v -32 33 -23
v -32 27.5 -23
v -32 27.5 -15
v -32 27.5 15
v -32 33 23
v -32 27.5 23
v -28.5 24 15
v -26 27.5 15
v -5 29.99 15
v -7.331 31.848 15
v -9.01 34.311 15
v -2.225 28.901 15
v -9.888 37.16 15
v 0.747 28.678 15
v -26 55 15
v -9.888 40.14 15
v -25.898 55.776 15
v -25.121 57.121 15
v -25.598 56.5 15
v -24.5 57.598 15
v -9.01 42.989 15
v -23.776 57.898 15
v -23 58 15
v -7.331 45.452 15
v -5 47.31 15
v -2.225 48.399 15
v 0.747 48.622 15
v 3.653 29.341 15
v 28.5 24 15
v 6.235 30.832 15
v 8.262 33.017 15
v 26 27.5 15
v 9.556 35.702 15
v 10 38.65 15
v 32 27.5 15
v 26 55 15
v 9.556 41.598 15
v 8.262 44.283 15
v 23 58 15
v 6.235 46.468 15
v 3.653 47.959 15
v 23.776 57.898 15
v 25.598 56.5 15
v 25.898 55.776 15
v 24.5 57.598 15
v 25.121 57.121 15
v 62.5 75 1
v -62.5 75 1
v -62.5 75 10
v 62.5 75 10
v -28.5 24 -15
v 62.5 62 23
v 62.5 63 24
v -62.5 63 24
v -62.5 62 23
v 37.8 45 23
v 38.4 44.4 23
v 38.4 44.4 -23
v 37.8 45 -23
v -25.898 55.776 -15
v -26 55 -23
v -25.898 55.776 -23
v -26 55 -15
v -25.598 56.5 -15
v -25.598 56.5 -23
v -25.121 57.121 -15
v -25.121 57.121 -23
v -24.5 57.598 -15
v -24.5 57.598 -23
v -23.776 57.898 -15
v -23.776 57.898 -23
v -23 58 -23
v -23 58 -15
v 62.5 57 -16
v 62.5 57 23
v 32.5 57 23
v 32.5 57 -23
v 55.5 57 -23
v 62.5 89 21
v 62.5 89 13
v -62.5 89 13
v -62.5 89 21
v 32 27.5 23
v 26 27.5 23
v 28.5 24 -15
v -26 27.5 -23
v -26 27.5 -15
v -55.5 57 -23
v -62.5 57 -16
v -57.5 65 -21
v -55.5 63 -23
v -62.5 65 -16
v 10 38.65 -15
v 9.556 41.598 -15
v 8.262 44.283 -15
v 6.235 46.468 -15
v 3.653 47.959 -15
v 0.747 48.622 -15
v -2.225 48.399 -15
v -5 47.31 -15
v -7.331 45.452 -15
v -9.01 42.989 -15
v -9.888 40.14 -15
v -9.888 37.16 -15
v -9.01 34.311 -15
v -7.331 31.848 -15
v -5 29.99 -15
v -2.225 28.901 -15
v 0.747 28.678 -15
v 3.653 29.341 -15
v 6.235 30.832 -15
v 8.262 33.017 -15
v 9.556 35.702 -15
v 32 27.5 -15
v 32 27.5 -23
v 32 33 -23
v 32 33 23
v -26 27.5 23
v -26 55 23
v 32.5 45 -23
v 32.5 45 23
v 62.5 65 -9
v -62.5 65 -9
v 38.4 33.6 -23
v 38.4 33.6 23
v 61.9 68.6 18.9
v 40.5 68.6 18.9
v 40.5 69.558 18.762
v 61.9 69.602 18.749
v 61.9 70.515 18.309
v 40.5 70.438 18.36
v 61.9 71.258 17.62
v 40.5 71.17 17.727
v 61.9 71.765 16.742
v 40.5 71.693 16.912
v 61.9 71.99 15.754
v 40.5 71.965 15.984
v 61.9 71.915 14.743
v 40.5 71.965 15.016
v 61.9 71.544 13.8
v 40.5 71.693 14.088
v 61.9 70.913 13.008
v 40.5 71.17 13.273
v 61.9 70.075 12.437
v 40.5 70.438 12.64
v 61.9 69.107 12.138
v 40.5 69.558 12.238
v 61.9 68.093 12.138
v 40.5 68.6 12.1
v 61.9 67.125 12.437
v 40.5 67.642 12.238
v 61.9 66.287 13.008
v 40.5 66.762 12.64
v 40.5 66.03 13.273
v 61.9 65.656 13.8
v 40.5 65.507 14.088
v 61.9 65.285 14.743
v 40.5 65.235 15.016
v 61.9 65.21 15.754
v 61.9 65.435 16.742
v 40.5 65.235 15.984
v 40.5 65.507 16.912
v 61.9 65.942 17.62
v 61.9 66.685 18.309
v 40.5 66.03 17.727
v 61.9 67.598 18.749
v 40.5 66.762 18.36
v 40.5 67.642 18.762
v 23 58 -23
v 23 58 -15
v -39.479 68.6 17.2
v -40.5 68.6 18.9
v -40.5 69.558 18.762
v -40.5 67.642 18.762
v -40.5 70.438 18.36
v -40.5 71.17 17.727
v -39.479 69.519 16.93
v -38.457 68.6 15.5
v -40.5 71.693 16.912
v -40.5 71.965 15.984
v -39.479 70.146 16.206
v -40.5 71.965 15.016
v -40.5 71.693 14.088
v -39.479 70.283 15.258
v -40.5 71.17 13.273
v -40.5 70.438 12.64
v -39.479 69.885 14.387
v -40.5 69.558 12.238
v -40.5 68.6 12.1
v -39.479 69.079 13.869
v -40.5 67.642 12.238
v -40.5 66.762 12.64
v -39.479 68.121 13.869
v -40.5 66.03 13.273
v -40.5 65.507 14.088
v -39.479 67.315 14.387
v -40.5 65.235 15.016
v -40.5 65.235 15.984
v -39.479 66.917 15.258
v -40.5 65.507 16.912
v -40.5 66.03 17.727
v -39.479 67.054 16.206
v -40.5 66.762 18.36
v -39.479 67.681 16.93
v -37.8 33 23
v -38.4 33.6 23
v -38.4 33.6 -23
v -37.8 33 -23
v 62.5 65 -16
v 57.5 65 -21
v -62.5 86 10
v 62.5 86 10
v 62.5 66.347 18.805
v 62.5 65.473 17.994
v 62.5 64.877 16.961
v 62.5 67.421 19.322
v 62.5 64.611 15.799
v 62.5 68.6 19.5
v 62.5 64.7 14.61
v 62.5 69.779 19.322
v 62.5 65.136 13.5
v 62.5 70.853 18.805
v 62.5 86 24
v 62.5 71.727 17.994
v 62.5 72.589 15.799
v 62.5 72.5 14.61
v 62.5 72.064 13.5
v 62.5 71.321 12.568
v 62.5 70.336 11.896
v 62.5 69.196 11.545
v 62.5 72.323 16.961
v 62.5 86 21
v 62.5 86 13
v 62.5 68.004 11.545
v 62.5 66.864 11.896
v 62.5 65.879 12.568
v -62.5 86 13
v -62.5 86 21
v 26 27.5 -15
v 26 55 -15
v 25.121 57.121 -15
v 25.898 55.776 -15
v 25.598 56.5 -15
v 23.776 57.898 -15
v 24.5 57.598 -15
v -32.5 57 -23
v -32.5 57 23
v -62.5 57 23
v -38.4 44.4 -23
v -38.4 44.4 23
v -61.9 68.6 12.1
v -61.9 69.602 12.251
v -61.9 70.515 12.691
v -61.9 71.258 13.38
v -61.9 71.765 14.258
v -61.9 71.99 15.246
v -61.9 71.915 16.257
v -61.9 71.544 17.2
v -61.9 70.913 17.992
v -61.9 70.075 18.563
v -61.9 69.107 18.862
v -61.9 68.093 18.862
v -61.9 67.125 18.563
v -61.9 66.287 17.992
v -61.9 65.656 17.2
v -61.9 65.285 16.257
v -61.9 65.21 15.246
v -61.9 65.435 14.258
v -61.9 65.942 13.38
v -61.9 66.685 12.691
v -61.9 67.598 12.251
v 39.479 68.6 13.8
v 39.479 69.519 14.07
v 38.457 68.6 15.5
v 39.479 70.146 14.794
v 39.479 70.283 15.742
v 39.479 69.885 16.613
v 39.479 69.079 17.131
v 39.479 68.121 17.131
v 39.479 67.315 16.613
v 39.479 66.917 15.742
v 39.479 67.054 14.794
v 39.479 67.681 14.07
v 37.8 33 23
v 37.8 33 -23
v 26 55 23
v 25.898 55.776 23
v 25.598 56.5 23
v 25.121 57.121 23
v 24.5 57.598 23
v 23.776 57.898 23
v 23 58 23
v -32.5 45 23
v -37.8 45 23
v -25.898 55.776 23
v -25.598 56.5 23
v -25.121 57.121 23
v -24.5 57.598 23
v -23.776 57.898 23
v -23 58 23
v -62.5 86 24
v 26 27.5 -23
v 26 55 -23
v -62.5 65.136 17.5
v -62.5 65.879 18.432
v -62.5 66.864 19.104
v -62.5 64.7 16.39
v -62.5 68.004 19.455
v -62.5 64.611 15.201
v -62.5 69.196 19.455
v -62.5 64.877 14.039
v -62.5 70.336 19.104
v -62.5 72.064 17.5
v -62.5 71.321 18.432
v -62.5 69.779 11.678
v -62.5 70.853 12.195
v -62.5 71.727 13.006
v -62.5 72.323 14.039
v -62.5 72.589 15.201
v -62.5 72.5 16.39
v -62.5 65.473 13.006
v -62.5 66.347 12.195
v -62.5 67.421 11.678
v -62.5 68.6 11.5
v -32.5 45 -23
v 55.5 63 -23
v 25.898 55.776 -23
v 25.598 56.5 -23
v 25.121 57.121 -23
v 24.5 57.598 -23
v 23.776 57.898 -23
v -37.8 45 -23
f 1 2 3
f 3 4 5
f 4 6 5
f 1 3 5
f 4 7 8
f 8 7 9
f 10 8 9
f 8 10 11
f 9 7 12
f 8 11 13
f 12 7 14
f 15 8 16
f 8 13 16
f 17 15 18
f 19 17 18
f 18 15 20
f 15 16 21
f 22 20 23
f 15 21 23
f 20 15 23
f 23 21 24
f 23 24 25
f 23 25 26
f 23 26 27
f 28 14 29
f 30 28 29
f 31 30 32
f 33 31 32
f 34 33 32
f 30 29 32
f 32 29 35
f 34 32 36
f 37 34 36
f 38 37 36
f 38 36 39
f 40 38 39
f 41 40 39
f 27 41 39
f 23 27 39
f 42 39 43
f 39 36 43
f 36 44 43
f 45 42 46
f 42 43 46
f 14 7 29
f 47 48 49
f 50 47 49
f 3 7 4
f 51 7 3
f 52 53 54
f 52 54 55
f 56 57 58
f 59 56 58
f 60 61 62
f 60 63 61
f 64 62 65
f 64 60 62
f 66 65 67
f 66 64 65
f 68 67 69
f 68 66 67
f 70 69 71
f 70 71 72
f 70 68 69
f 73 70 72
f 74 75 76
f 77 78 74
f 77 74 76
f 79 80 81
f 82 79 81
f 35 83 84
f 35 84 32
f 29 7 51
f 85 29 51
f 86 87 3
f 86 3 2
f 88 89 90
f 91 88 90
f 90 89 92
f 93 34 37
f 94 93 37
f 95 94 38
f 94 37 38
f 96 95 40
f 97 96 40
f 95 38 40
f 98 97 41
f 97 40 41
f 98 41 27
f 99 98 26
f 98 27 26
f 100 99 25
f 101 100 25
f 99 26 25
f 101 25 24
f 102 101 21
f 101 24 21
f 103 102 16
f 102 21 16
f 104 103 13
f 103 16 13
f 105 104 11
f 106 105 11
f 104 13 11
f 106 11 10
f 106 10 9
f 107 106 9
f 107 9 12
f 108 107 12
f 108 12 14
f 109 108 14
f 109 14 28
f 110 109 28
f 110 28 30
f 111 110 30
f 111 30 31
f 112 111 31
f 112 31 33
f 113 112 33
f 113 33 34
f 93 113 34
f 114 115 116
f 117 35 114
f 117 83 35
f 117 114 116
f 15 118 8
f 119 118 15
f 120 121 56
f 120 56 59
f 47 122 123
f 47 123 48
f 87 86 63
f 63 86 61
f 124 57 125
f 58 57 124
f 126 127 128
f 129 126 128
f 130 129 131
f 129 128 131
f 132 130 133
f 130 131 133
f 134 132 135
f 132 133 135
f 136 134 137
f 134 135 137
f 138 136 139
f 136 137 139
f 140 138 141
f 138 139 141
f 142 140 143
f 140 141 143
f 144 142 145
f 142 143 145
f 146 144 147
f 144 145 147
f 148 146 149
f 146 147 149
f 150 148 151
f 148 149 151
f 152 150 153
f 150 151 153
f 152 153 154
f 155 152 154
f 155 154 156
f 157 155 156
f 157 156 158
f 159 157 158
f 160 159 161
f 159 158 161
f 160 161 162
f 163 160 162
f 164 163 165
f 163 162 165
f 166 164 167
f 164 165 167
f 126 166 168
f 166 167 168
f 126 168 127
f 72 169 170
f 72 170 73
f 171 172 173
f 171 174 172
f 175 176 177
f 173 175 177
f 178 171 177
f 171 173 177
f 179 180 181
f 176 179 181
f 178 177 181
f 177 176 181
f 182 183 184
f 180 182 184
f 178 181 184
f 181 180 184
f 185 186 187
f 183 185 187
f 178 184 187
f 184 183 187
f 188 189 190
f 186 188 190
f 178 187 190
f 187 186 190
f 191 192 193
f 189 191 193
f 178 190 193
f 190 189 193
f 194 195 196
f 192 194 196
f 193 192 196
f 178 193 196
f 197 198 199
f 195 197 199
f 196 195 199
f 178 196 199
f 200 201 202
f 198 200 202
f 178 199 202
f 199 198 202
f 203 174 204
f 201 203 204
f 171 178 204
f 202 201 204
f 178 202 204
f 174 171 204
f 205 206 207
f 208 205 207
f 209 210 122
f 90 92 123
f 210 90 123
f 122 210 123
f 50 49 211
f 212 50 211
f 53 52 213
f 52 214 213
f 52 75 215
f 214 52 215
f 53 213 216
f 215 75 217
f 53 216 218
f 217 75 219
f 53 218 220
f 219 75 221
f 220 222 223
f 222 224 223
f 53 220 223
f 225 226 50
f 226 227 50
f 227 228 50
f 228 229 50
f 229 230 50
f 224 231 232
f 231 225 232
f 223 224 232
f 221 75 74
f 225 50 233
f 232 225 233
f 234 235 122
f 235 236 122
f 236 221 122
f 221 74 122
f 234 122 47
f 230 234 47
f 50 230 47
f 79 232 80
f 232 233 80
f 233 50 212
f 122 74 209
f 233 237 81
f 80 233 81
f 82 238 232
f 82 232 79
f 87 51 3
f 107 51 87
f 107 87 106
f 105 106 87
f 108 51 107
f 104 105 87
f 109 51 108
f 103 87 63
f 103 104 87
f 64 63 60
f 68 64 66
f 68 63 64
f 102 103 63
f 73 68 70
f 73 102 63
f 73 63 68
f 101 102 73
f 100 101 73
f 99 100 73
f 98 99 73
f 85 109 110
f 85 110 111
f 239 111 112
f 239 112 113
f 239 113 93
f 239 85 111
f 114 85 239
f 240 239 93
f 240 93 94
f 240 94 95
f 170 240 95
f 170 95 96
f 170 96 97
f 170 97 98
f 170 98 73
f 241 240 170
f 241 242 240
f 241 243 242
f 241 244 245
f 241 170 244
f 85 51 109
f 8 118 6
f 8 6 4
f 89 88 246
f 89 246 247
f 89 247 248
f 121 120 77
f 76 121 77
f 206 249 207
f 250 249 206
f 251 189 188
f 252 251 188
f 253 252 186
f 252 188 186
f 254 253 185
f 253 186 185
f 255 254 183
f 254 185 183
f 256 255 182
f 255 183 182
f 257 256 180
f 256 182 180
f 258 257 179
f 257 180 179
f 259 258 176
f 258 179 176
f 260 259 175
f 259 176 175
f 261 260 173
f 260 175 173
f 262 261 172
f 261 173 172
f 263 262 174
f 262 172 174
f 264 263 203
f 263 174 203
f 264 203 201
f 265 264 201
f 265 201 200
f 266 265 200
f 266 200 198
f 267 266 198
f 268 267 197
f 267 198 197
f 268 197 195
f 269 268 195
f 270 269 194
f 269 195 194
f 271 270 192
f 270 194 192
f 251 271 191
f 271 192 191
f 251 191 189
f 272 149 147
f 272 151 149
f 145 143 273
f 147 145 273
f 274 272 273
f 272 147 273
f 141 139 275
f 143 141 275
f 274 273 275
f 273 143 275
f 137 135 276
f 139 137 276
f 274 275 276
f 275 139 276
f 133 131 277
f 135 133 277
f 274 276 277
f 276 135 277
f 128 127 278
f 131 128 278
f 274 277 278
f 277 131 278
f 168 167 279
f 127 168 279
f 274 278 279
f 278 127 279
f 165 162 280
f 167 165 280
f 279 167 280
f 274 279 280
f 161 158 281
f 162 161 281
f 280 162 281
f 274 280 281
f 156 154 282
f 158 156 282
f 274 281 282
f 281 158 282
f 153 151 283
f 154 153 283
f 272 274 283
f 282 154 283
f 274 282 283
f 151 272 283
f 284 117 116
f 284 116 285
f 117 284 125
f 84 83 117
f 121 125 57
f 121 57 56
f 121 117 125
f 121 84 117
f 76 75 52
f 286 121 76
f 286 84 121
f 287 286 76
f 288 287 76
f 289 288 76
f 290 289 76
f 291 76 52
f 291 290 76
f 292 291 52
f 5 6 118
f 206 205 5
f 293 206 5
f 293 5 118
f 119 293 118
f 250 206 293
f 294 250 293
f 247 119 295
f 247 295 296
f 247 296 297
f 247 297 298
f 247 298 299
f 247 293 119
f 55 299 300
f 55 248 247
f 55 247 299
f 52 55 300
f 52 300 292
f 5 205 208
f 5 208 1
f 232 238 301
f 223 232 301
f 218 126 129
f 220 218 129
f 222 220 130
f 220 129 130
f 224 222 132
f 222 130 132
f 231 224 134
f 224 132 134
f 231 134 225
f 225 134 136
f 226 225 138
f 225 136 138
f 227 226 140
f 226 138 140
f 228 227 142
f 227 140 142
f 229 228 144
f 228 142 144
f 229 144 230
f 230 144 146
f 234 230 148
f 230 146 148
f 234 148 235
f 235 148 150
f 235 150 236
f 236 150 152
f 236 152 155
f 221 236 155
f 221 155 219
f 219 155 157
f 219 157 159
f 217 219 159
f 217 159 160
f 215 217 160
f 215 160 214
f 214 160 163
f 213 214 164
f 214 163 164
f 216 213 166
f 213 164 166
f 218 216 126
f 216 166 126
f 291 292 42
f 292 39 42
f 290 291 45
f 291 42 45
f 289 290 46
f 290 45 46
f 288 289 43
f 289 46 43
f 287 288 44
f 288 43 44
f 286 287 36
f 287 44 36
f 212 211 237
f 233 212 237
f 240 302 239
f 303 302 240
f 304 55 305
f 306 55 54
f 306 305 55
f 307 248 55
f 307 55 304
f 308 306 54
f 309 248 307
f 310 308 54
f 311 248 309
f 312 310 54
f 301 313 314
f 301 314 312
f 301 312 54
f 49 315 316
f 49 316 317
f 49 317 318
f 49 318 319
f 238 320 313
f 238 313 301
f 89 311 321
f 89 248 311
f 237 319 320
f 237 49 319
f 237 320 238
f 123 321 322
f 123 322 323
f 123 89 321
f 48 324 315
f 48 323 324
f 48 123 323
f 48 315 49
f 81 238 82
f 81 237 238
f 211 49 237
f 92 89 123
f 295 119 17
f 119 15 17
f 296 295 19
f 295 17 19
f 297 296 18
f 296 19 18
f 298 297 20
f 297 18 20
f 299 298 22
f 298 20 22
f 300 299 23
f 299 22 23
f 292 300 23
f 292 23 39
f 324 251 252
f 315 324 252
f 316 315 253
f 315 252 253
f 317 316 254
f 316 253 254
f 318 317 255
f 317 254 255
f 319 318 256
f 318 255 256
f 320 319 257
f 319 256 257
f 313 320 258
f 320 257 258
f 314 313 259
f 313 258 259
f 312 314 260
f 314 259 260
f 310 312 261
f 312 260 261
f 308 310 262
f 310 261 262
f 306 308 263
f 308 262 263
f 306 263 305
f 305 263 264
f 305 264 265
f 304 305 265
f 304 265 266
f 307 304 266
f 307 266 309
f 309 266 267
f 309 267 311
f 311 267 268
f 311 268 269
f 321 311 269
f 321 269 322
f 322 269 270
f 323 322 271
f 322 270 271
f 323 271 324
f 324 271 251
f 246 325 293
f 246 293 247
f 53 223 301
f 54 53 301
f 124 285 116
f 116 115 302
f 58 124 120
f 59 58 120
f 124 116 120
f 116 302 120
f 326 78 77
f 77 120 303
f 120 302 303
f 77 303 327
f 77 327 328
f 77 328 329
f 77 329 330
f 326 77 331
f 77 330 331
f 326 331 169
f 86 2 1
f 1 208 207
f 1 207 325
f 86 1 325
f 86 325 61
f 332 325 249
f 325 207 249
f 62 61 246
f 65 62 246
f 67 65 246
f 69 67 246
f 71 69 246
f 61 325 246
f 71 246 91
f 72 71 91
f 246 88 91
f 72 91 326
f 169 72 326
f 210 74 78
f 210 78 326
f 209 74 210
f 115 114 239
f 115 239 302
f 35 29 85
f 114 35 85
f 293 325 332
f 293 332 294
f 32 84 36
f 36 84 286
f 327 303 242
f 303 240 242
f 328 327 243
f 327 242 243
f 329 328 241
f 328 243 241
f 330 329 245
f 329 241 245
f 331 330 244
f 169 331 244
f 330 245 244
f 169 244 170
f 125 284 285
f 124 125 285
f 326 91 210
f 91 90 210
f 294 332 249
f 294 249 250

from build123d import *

# Parameters (mm, degrees)
SKETCH1_W                      = 125
SKETCH1_H                      = 65
BOSS_EXTRUDE1_DEPTH            = 47
CUT_EXTRUDE1_DEPTH             = 156.312588028
SKETCH3_W                      = 30
SKETCH3_H                      = 33
CUT_EXTRUDE2_DEPTH             = 119.474680839
SKETCH4_W                      = 46
SKETCH4_H                      = 21
BOSS_EXTRUDE2_DEPTH            = 5.9
SKETCH5_W                      = 30
SKETCH5_H                      = 33
CUT_EXTRUDE3_DEPTH             = 119.474680839
SKETCH6_W                      = 46
SKETCH6_H                      = 21
BOSS_EXTRUDE3_DEPTH            = 5.9
SKETCH7_W                      = 6.4
SKETCH7_H                      = 9
CUT_EXTRUDE4_DEPTH             = 119.081539624
SKETCH8_W                      = 6.4
SKETCH8_H                      = 9
CUT_EXTRUDE5_DEPTH             = 119.081539624
SKETCH9_W                      = 8
SKETCH9_H                      = 3.5
CUT_EXTRUDE6_DEPTH             = 133.012310032
SKETCH10_W                     = 52
SKETCH10_H                     = 30.5
CUT_EXTRUDE7_DEPTH             = 8
SKETCH11_W                     = 8
SKETCH11_H                     = 3.5
CUT_EXTRUDE8_DEPTH             = 133.012310032
SKETCH12_W                     = 52
SKETCH12_H                     = 30.5
CUT_EXTRUDE9_DEPTH             = 8
SKETCH13_W                     = 33
SKETCH13_H                     = 14
CUT_EXTRUDE10_DEPTH            = 156.312588028
CUT_EXTRUDE11_DEPTH            = 156.312588028
SKETCH15_W                     = 3
SKETCH15_H                     = 3
CUT_EXTRUDE12_DEPTH            = 156.312588028
SKETCH16_W                     = 3
SKETCH16_H                     = 3
CUT_EXTRUDE13_DEPTH            = 156.312588028
F_6_8_6_8_DIAMETER_HOLE1_D     = 6.8
F_6_8_6_8_DIAMETER_HOLE1_DEPTH = 22
F_6_8_6_8_DIAMETER_HOLE1_TIP   = 2.042926105
F_6_8_6_8_DIAMETER_HOLE2_D     = 6.8
F_6_8_6_8_DIAMETER_HOLE2_DEPTH = 22
F_6_8_6_8_DIAMETER_HOLE2_TIP   = 2.042926105
F_20_0_20_DIAMETER_HOLE1_D     = 20
F_20_0_20_DIAMETER_HOLE1_DEPTH = 39
CHAMFER1_SIZE                  = 0.6
CHAMFER2_SIZE                  = 2
CHAMFER3_SIZE                  = 3.5
CHAMFER4_SIZE                  = 7
FILLET1_R                      = 3


with BuildPart() as part:
    # Sketch1 → Boss-Extrude1 (new body)
    with BuildSketch(Plane(origin=(0, 0, -23), x_dir=(-1, 0, 0), z_dir=(0, 0, -1))):
        with Locations((0, 56.5)):
            Rectangle(SKETCH1_W, SKETCH1_H)
    extrude(amount=-BOSS_EXTRUDE1_DEPTH)

    # Sketch2 → Cut-Extrude1 (cut, through all)
    with BuildSketch(Plane.ZY.offset(62.5)):
        Polygon((24, 24), (24, 63), (23, 62), (23, 24), align=None)
    extrude(amount=-CUT_EXTRUDE1_DEPTH, mode=Mode.SUBTRACT)

    # Sketch3 → Cut-Extrude2 (cut, through all)
    with BuildSketch(Plane(origin=(0, 0, -23), x_dir=(-1, 0, 0), z_dir=(0, 0, -1))):
        with Locations((47.5, 40.5)):
            Rectangle(SKETCH3_W, SKETCH3_H)
    extrude(amount=-CUT_EXTRUDE2_DEPTH, mode=Mode.SUBTRACT)

    # Sketch4 → Boss-Extrude2 (add)
    with BuildSketch(Plane.ZY.offset(32.5)):
        with Locations((0, 34.5)):
            Rectangle(SKETCH4_W, SKETCH4_H)
    extrude(amount=BOSS_EXTRUDE2_DEPTH)

    # Sketch5 → Cut-Extrude3 (cut, through all)
    with BuildSketch(Plane(origin=(0, 0, -23), x_dir=(-1, 0, 0), z_dir=(0, 0, -1))):
        with Locations((-47.5, 40.5)):
            Rectangle(SKETCH5_W, SKETCH5_H)
    extrude(amount=-CUT_EXTRUDE3_DEPTH, mode=Mode.SUBTRACT)

    # Sketch6 → Boss-Extrude3 (add)
    with BuildSketch(Plane(origin=(32.5, 0, 0), x_dir=(0, 0, -1), z_dir=(1, 0, 0))):
        with Locations((0, 34.5)):
            Rectangle(SKETCH6_W, SKETCH6_H)
    extrude(amount=BOSS_EXTRUDE3_DEPTH)

    # Sketch7 → Cut-Extrude4 (cut, through all)
    with BuildSketch(Plane.XY.offset(23)):
        with Locations((35.2, 28.5)):
            Rectangle(SKETCH7_W, SKETCH7_H)
    extrude(amount=-CUT_EXTRUDE4_DEPTH, mode=Mode.SUBTRACT)

    # Sketch8 → Cut-Extrude5 (cut, through all)
    with BuildSketch(Plane.XY.offset(23)):
        with Locations((-35.2, 28.5)):
            Rectangle(SKETCH8_W, SKETCH8_H)
    extrude(amount=-CUT_EXTRUDE5_DEPTH, mode=Mode.SUBTRACT)

    # Sketch9 → Cut-Extrude6 (cut, through all)
    with BuildSketch(Plane(origin=(32, 0, 0), x_dir=(0, 0, -1), z_dir=(1, 0, 0))):
        with Locations((-19, 25.75)):
            Rectangle(SKETCH9_W, SKETCH9_H)
    extrude(amount=-CUT_EXTRUDE6_DEPTH, mode=Mode.SUBTRACT)

    # Sketch10 → Cut-Extrude7 (cut)
    with BuildSketch(Plane.XY.offset(23)):
        with Locations((0, 42.75)):
            Rectangle(SKETCH10_W, SKETCH10_H)
    extrude(amount=-CUT_EXTRUDE7_DEPTH, mode=Mode.SUBTRACT)

    # Sketch11 → Cut-Extrude8 (cut, through all)
    with BuildSketch(Plane(origin=(32, 0, 0), x_dir=(0, 0, -1), z_dir=(1, 0, 0))):
        with Locations((19, 25.75)):
            Rectangle(SKETCH11_W, SKETCH11_H)
    extrude(amount=-CUT_EXTRUDE8_DEPTH, mode=Mode.SUBTRACT)

    # Sketch12 → Cut-Extrude9 (cut)
    with BuildSketch(Plane(origin=(0, 0, -23), x_dir=(-1, 0, 0), z_dir=(0, 0, -1))):
        with Locations((0, 42.75)):
            Rectangle(SKETCH12_W, SKETCH12_H)
    extrude(amount=-CUT_EXTRUDE9_DEPTH, mode=Mode.SUBTRACT)

    # Sketch13 → Cut-Extrude10 (cut, through all)
    with BuildSketch(Plane.ZY.offset(62.5)):
        with Locations((-6.5, 82)):
            Rectangle(SKETCH13_W, SKETCH13_H)
    extrude(amount=-CUT_EXTRUDE10_DEPTH, mode=Mode.SUBTRACT)

    # Sketch14 → Cut-Extrude11 (cut, through all)
    with BuildSketch(Plane.ZY.offset(62.5)):
        Polygon((-23, 75), (-23, 65), (-9, 65), (1, 75), align=None)
    extrude(amount=-CUT_EXTRUDE11_DEPTH, mode=Mode.SUBTRACT)

    # Sketch15 → Cut-Extrude12 (cut, through all)
    with BuildSketch(Plane.ZY.offset(62.5)):
        with Locations((11.5, 87.5)):
            Rectangle(SKETCH15_W, SKETCH15_H)
    extrude(amount=-CUT_EXTRUDE12_DEPTH, mode=Mode.SUBTRACT)

    # Sketch16 → Cut-Extrude13 (cut, through all)
    with BuildSketch(Plane.ZY.offset(62.5)):
        with Locations((22.5, 87.5)):
            Rectangle(SKETCH16_W, SKETCH16_H)
    extrude(amount=-CUT_EXTRUDE13_DEPTH, mode=Mode.SUBTRACT)

    # Ø6.8 (6.8) Diameter Hole1
    with Locations(Plane.ZY.offset(62.5)):
        with Locations((15.5, 68.6)):
            Hole(F_6_8_6_8_DIAMETER_HOLE1_D / 2, depth=F_6_8_6_8_DIAMETER_HOLE1_DEPTH)
            with Locations((0, 0, -(F_6_8_6_8_DIAMETER_HOLE1_DEPTH + F_6_8_6_8_DIAMETER_HOLE1_TIP / 2))):  # 118° drill point
                Cone(0, F_6_8_6_8_DIAMETER_HOLE1_D / 2, F_6_8_6_8_DIAMETER_HOLE1_TIP, mode=Mode.SUBTRACT)

    # Ø6.8 (6.8) Diameter Hole2
    with Locations(Plane(origin=(62.5, 0, 0), x_dir=(0, 0, -1), z_dir=(1, 0, 0))):
        with Locations((-15.5, 68.6)):
            Hole(F_6_8_6_8_DIAMETER_HOLE2_D / 2, depth=F_6_8_6_8_DIAMETER_HOLE2_DEPTH)
            with Locations((0, 0, -(F_6_8_6_8_DIAMETER_HOLE2_DEPTH + F_6_8_6_8_DIAMETER_HOLE2_TIP / 2))):  # 118° drill point
                Cone(0, F_6_8_6_8_DIAMETER_HOLE2_D / 2, F_6_8_6_8_DIAMETER_HOLE2_TIP, mode=Mode.SUBTRACT)

    # Ø20.0 (20) Diameter Hole1
    with Locations(Plane(origin=(0, 0, -15), x_dir=(-1, 0, 0), z_dir=(0, 0, -1))):
        with Locations((0, 38.65)):
            Hole(F_20_0_20_DIAMETER_HOLE1_D / 2, depth=F_20_0_20_DIAMETER_HOLE1_DEPTH)

    # Chamfer1
    chamfer1_edges = [part.edges().sort_by_distance(p)[0] for p in [
        (38.4, 33, 0),
        (-38.4, 33, 0),
        (-62.5, 68.6, 18.9),
        (62.5, 68.6, 12.1),
        (-38.4, 45, 0),
        (38.4, 45, 0),
    ]]
    chamfer(chamfer1_edges, length=CHAMFER1_SIZE)

    # Chamfer2
    chamfer2_edges = [part.edges().sort_by_distance(p)[0] for p in [
        (0, 65, -23),
    ]]
    chamfer(chamfer2_edges, length=CHAMFER2_SIZE)

    # Chamfer3
    chamfer3_edges = [part.edges().sort_by_distance(p)[0] for p in [
        (32, 24, 0),
        (-32, 24, 0),
    ]]
    chamfer(chamfer3_edges, length=CHAMFER3_SIZE)

    # Chamfer4
    chamfer4_edges = [part.edges().sort_by_distance(p)[0] for p in [
        (-62.5, 60, -23),
        (62.5, 60, -23),
    ]]
    chamfer(chamfer4_edges, length=CHAMFER4_SIZE)

    # Fillet1
    fillet1_edges = [part.edges().sort_by_distance(p)[0] for p in [
        (-26, 58, 19),
        (26, 58, 19),
        (-26, 58, -19),
        (26, 58, -19),
    ]]
    fillet(fillet1_edges, radius=FILLET1_R)


solid = part.part
